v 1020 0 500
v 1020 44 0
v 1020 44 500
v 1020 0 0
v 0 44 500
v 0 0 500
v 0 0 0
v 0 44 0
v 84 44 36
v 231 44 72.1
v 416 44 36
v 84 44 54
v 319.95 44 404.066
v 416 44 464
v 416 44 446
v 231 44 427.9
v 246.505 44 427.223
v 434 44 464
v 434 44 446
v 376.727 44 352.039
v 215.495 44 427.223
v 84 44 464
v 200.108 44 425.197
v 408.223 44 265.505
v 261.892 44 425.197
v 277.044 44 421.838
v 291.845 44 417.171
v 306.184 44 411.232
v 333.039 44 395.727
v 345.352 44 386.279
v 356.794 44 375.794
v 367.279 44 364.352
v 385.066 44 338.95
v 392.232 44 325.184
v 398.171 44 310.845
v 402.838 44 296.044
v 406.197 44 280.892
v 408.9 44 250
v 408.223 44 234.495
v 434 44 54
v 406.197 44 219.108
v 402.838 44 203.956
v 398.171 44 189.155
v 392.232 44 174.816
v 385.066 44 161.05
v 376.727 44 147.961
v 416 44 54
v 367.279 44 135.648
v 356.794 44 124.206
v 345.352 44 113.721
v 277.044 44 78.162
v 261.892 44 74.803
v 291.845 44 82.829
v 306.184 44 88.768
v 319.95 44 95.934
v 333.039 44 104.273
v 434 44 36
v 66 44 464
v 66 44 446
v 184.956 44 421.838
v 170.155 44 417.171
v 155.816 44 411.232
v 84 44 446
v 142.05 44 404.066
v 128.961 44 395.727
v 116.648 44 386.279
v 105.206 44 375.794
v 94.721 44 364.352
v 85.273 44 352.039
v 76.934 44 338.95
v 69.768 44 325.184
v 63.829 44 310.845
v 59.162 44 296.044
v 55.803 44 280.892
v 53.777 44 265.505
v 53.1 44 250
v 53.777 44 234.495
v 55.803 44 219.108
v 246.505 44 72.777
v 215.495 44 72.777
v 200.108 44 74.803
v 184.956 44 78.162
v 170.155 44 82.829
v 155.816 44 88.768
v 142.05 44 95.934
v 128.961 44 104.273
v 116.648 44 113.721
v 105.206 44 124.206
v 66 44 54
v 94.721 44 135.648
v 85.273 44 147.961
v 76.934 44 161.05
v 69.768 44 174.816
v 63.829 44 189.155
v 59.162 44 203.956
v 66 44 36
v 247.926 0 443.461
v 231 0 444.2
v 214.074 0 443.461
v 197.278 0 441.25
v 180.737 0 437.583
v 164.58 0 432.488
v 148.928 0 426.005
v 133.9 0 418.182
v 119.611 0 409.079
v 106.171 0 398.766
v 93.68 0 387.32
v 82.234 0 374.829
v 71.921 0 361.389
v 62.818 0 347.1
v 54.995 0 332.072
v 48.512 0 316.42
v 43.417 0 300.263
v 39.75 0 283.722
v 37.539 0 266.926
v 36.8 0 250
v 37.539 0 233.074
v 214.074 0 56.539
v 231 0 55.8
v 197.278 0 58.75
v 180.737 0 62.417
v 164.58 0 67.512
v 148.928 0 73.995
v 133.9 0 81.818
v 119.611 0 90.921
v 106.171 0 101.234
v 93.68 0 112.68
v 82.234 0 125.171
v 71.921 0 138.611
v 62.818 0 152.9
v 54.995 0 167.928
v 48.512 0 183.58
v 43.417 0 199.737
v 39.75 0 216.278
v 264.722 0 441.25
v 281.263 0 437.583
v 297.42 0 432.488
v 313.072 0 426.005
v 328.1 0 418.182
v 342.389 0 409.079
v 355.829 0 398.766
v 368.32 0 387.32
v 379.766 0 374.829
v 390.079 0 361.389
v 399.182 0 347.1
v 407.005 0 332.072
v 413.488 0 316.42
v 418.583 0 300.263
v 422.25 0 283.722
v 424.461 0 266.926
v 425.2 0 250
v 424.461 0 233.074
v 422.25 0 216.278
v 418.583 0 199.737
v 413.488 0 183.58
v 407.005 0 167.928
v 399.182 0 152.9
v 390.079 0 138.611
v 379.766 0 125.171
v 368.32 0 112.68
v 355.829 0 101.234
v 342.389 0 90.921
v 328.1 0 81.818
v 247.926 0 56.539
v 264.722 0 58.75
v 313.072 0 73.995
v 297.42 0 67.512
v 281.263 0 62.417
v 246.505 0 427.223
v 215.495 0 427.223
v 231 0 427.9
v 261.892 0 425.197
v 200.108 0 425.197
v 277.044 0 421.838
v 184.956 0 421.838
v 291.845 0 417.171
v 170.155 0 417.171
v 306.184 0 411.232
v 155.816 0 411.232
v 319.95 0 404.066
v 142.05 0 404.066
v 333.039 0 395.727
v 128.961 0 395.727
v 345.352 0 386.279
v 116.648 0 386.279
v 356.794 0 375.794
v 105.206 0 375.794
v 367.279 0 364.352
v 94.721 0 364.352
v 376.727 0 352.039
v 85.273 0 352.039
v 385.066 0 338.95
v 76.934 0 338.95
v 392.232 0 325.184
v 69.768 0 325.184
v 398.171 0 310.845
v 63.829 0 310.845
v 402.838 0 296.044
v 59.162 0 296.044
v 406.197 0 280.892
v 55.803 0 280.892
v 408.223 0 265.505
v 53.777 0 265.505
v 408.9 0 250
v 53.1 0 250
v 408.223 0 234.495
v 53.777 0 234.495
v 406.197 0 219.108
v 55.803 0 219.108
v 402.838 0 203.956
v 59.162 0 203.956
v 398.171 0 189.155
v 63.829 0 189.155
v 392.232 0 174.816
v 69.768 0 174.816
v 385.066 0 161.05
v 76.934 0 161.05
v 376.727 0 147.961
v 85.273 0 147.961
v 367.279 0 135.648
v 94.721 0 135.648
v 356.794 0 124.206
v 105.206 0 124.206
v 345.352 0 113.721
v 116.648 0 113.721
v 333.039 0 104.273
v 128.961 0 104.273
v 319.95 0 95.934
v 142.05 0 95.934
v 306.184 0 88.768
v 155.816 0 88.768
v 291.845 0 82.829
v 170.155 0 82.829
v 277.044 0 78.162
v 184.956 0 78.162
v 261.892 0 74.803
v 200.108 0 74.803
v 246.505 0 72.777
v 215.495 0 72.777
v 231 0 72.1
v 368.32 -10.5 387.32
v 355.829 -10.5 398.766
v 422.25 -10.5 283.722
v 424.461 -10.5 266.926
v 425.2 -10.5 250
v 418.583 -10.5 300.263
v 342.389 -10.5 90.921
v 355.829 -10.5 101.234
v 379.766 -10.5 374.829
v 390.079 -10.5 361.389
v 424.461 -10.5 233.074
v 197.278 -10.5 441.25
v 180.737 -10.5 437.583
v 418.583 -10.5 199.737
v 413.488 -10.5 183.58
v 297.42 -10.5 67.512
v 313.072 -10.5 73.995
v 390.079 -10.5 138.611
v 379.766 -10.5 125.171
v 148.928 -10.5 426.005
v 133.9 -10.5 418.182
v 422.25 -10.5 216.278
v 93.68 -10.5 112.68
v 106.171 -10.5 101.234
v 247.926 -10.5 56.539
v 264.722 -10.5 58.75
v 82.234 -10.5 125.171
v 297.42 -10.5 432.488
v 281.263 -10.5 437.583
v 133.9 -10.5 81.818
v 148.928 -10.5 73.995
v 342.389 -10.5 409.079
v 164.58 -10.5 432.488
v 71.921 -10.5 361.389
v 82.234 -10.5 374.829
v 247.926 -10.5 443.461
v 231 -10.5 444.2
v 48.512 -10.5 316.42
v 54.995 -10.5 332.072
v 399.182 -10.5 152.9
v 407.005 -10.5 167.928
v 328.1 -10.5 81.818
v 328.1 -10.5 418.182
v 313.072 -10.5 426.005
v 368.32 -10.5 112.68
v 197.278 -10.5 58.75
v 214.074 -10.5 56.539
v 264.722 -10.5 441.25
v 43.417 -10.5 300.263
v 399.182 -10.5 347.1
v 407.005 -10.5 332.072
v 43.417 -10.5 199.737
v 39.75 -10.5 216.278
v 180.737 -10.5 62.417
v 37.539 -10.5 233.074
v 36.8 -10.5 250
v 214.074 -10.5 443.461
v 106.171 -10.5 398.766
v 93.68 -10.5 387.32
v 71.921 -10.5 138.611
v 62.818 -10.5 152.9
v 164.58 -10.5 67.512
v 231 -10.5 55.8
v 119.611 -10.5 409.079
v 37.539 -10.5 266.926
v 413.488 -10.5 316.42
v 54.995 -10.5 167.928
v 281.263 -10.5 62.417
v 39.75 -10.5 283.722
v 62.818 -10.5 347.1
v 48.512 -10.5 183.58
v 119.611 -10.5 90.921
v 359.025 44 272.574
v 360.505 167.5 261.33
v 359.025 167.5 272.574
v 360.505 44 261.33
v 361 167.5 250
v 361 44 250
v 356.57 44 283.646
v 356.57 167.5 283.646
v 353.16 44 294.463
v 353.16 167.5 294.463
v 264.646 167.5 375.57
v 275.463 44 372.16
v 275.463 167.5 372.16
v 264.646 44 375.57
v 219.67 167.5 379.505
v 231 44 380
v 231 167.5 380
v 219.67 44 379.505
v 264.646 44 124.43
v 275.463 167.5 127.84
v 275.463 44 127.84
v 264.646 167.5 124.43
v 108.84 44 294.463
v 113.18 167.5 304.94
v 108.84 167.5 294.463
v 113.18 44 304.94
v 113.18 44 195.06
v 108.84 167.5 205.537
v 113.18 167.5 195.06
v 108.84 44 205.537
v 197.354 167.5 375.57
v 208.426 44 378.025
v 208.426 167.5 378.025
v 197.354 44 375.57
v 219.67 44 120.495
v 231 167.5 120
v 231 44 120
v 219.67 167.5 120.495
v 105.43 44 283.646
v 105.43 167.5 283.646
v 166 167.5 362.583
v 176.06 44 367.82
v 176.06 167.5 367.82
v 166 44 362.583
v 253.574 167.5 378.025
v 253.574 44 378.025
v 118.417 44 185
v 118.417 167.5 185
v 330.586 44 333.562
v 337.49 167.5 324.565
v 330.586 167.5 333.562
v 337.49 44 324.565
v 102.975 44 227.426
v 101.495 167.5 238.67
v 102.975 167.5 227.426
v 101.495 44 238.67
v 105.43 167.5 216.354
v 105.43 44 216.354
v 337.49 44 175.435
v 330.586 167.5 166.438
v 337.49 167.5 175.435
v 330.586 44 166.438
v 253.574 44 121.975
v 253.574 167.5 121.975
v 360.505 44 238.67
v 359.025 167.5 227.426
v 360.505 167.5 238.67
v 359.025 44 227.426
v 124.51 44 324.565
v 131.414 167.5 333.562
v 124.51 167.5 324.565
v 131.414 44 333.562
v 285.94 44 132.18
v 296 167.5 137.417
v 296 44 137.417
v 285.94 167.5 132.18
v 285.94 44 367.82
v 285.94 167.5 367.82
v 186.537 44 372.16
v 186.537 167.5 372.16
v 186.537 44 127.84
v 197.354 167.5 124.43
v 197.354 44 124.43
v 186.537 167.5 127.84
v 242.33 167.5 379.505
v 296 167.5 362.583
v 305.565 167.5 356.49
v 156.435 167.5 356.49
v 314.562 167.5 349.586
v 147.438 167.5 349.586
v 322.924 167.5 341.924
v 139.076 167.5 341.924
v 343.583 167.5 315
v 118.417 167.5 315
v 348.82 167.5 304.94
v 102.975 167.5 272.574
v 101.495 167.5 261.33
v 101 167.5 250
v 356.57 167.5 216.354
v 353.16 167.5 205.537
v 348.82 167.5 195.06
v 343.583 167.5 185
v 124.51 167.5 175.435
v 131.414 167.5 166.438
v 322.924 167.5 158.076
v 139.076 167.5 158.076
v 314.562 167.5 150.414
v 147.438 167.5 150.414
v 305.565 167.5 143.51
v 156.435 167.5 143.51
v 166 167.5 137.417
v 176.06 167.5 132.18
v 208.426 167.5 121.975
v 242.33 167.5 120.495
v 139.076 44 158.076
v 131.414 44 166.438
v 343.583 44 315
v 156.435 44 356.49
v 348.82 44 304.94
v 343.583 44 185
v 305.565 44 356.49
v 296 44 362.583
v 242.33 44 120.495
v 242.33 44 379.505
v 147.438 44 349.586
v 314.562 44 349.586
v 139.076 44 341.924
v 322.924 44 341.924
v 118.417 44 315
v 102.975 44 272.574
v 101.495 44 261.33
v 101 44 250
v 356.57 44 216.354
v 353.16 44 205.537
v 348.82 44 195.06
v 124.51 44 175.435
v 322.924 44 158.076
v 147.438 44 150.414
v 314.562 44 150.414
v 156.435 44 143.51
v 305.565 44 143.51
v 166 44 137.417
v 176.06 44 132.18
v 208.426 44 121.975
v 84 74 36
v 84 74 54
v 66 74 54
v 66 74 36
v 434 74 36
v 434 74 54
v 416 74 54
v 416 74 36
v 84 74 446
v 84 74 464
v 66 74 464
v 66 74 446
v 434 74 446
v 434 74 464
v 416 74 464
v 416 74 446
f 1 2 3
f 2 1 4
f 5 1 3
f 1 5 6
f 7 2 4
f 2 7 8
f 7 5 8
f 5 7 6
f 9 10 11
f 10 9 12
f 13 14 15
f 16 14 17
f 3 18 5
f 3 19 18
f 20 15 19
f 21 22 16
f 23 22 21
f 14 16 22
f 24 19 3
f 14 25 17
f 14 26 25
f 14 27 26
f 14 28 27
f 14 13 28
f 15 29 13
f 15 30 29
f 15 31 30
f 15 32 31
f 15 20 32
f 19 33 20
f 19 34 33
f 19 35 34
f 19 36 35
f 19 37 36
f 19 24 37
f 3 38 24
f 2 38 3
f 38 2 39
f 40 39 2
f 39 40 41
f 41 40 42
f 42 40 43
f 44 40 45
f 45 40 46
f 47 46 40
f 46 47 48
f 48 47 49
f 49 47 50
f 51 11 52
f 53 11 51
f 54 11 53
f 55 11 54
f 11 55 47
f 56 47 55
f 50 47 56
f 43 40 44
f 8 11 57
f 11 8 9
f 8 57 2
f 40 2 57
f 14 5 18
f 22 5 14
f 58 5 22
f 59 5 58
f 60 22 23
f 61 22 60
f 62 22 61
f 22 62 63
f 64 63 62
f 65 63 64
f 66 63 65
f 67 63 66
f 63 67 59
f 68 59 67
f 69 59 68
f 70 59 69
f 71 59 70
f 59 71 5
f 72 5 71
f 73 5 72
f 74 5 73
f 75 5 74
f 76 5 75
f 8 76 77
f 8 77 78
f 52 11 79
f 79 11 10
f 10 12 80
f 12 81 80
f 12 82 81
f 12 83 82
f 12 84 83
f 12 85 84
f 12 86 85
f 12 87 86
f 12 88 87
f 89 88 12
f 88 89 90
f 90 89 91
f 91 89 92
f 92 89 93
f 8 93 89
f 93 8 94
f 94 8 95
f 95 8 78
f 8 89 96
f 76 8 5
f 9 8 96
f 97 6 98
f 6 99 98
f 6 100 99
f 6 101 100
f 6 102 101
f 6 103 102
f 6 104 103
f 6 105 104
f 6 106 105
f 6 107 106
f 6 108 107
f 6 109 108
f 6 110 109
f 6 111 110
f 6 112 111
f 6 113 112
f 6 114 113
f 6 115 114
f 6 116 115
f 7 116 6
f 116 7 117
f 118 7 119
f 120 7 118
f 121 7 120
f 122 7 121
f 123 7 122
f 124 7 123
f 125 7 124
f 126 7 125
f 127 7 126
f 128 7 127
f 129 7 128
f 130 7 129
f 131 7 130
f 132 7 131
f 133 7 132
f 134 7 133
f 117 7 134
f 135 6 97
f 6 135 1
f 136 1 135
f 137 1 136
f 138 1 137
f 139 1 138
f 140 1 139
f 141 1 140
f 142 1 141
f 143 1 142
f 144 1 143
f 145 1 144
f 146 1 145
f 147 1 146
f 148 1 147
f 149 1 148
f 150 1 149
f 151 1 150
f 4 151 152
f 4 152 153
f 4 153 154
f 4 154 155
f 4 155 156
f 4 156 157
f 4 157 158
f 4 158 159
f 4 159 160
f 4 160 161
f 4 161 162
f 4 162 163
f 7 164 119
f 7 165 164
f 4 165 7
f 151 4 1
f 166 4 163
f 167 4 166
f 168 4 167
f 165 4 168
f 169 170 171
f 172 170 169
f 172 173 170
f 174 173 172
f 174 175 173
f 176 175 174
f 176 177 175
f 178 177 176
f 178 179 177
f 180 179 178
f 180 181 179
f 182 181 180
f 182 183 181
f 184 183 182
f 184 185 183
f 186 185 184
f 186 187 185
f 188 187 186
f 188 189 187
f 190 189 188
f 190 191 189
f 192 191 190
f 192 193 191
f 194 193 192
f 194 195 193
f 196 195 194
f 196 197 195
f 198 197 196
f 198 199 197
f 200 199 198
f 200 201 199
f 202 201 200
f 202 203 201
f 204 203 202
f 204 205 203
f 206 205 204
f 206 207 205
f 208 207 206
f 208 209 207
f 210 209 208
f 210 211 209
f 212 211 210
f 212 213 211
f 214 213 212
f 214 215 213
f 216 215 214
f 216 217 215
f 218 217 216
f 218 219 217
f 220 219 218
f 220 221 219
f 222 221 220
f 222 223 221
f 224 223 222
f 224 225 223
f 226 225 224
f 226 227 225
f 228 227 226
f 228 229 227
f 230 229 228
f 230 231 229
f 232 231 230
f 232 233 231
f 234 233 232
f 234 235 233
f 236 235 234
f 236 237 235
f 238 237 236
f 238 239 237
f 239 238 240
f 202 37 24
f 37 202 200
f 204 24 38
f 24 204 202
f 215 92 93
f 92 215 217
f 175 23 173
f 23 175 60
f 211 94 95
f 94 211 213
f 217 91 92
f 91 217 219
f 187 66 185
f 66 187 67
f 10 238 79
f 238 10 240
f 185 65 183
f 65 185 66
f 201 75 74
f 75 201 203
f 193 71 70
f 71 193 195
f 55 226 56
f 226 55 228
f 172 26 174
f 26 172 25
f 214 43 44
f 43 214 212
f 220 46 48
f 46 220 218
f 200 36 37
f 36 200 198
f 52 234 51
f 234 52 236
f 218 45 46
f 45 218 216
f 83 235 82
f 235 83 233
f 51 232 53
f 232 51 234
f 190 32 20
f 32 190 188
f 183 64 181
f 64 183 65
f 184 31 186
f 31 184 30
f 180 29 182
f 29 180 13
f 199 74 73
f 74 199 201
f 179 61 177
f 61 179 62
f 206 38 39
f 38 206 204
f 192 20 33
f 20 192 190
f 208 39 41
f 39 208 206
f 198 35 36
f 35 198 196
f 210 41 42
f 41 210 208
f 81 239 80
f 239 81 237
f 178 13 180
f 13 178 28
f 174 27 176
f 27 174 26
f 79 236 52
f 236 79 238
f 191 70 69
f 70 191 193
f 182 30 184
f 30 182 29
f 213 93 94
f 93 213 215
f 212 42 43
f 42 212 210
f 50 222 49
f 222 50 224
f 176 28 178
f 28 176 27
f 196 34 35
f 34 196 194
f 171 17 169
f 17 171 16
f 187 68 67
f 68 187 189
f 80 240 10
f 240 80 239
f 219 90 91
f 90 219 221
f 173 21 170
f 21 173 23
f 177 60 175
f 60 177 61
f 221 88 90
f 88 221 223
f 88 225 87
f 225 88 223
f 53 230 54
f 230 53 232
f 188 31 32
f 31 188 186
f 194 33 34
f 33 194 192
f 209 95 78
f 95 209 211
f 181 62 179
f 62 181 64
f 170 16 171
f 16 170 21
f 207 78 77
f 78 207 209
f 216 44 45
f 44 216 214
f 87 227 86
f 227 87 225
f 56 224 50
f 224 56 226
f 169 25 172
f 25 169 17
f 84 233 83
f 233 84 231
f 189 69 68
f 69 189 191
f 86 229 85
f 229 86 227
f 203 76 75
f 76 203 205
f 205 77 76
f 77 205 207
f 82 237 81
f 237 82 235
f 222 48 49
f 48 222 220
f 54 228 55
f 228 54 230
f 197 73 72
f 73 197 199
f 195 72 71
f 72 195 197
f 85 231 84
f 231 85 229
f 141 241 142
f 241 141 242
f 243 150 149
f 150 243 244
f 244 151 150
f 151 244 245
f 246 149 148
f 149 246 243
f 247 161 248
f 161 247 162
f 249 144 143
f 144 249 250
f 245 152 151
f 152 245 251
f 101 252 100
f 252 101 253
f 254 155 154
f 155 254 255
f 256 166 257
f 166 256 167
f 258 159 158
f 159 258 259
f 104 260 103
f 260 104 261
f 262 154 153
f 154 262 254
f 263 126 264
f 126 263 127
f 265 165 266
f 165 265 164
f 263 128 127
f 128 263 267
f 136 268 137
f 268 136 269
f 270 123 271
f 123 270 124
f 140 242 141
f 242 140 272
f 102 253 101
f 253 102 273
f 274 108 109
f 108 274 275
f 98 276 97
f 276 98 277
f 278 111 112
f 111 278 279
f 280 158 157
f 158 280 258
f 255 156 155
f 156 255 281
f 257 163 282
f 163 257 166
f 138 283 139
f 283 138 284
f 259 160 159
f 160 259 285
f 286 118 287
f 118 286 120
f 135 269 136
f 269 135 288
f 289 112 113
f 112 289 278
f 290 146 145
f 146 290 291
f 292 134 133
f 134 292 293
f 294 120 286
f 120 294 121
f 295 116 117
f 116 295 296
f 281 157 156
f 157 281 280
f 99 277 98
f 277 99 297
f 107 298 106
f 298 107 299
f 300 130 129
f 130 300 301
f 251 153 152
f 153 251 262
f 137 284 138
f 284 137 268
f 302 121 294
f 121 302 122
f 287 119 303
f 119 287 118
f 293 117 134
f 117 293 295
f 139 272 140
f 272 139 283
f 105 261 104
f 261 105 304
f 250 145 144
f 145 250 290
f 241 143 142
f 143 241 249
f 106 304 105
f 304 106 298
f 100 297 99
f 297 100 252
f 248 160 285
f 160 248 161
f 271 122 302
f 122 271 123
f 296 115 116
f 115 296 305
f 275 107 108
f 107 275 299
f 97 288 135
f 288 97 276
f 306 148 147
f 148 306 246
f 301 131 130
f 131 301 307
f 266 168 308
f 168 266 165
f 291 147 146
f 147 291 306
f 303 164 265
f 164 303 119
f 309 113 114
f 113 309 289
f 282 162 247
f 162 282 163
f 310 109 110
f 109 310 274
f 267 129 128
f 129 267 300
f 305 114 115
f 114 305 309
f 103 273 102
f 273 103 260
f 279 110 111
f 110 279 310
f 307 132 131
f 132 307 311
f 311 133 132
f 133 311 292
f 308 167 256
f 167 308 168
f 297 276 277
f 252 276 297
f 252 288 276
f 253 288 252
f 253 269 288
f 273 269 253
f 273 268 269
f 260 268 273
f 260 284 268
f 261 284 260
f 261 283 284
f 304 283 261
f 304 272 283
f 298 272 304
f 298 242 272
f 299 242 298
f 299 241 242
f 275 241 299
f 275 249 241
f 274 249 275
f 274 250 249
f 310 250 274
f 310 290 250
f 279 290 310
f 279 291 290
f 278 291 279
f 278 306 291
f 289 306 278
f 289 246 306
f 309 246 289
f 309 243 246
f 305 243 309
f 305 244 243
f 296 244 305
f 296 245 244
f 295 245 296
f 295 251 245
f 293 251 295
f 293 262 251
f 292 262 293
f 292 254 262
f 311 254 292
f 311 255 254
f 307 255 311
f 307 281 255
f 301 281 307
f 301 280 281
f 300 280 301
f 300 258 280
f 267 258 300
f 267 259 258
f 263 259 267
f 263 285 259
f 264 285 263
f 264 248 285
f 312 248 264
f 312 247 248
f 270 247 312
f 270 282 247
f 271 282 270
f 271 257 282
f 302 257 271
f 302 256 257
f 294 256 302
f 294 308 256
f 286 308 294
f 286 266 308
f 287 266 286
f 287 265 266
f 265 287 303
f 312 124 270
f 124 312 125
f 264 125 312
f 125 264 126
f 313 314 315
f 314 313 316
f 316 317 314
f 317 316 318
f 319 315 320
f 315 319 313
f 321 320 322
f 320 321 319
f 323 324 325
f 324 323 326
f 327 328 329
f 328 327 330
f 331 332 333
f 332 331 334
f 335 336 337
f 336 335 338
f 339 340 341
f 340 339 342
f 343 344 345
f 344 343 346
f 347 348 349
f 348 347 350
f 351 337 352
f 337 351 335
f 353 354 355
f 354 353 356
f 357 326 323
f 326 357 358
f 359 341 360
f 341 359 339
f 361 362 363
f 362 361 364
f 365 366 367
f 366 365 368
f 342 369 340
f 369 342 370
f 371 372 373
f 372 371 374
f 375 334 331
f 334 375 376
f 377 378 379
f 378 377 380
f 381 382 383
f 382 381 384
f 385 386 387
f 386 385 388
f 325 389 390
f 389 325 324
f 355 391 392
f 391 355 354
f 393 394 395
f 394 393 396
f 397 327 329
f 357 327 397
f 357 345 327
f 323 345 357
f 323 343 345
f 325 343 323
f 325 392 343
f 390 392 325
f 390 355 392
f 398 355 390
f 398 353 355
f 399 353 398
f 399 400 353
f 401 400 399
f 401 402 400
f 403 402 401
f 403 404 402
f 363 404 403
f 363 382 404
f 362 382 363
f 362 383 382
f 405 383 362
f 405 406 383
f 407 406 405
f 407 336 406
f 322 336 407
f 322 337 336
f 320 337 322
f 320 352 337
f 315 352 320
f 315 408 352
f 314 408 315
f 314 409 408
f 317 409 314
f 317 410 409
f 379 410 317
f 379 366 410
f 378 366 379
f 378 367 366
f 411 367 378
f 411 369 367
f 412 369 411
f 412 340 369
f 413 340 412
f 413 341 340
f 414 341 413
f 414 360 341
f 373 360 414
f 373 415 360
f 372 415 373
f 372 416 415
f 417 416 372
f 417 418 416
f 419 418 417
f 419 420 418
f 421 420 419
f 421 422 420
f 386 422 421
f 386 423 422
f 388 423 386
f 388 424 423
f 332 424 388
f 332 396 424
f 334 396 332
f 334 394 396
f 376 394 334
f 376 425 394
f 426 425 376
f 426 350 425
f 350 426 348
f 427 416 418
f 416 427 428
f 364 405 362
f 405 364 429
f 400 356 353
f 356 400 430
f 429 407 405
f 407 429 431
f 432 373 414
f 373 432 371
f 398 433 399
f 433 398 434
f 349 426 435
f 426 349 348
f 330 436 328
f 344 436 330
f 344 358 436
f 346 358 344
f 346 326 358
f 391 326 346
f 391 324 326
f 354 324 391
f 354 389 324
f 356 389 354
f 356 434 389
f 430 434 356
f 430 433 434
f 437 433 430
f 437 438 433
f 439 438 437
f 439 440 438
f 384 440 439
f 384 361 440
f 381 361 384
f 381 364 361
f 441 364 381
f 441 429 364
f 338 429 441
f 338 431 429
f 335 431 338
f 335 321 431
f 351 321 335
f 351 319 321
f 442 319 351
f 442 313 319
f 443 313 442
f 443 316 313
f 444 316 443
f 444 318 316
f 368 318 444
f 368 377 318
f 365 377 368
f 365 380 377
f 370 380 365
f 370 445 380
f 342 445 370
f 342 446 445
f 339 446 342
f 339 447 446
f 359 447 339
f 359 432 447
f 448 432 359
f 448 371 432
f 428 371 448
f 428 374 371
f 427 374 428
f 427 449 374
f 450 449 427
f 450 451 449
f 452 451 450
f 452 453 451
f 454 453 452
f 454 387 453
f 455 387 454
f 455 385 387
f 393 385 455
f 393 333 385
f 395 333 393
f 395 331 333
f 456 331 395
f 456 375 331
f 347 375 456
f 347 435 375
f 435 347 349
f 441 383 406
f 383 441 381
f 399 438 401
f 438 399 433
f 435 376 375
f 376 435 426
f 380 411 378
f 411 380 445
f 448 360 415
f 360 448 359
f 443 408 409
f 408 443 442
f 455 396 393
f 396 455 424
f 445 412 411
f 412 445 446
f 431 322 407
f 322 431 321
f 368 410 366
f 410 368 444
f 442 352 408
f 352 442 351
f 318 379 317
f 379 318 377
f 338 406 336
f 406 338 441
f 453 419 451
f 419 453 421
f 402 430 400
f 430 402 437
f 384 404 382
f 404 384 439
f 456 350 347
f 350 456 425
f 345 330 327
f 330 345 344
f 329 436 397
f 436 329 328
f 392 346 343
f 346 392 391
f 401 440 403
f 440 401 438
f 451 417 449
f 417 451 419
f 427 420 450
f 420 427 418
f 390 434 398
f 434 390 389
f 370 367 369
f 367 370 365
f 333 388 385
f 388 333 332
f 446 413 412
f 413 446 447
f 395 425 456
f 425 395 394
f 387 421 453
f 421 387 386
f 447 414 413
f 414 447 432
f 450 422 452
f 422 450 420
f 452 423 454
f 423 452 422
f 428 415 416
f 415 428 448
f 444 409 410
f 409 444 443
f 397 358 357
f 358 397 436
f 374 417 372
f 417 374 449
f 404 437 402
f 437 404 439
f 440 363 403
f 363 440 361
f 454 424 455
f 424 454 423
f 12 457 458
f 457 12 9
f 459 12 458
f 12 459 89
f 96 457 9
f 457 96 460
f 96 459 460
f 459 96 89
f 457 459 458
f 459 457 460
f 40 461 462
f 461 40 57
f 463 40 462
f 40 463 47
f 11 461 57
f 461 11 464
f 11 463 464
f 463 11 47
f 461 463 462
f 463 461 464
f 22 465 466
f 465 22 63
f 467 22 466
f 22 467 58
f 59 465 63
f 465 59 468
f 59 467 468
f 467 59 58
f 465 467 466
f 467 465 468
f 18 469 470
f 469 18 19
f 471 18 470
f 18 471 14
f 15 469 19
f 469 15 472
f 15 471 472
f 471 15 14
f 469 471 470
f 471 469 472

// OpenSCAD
// P42D - EXPLORATORY 3D paths; geometry only, NOT CNC or checked load paths.
// OpenSCAD, units mm. Change variant to "rails4" to compare.
// Driver basket/magnet and bolted connections are SURROGATES.
$fn=72;
variant="carrier4"; // carrier4 or rails4
show_panel=true;
show_driver_envelope=true;
show_supports=true;
show_straight_links=false; // WARNING: some straight 2D links cross cutout (P42C).
baffle_W=1020;baffle_D=425;baffle_H=500;front_t=44;wall_t=22;
driver_x=231;driver_z=250;cutout_d=355.8;frame_d=388.4;bolt_r=184;
carrier_points=[[75,45],[425,45],[75,455],[425,455]];
rails_points=[[176,37],[286,37],[176,463],[286,463]];
points=variant=="carrier4"?carrier_points:rails_points;
half_width=9;
assert(variant=="carrier4"||variant=="rails4","Unknown variant");
assert(driver_x-frame_d/2>wall_t,"Driver flanged edge crosses left inner wall");
assert(driver_z-frame_d/2>wall_t,"Driver flanged edge crosses lower inner wall");
module ycylinder(d,h,x,y,z){
 translate([x,y,z])rotate([90,0,0])cylinder(d=d,h=h,center=true);
}
module panel(){
 color([0.80,0.65,0.48,.75])difference(){
  cube([baffle_W,front_t,baffle_H]);
  ycylinder(cutout_d,front_t+2,driver_x,front_t/2,driver_z);
 }
}
module basket_envelope(){
 color([.22,.36,.52,.50])ycylinder(frame_d,10.5,driver_x,-5.25,driver_z);
 color([.35,.55,.65,.16])ycylinder(260,123.5,driver_x,front_t+123.5/2,driver_z);
}
module pad(q){
 color([.26,.58,.65,.85])translate([q[0]-half_width,front_t,q[1]-half_width])
 cube([2*half_width,30,2*half_width]);
}
module rail(q){
 color([.35,.58,.60,.65])translate([q[0]-half_width,front_t,q[1]-half_width])
 cube([2*half_width,baffle_D-front_t-wall_t,2*half_width]);
}
module link_segment(a,b){
 // Unqualified straight carrier link: may project into cutout/motor.
 color([.87,.43,.32,.70])hull(){
  ycylinder(8,7,a[0],front_t+8,a[1]);
  ycylinder(8,7,b[0],front_t+8,b[1]);
 }
}
function dist2(a,b)=(a[0]-b[0])*(a[0]-b[0])+(a[1]-b[1])*(a[1]-b[1]);
function nearest_pad_idx(b)=let(v=[for(i=[0:len(points)-1])dist2(points[i],b)])
 search(min(v),v)[0];
if(show_panel)panel();
if(show_driver_envelope)basket_envelope();
if(show_supports)for(p=points) {
 if(variant=="carrier4")pad(p);
 else rail(p);
}
if(show_straight_links)for(i=[0:7]){
 bolt=[driver_x+bolt_r*cos(45*i),driver_z+bolt_r*sin(45*i)];
 link_segment(bolt,points[nearest_pad_idx(bolt)]);
}
echo("P41 supports:",variant,"points:",len(points));
echo("All support-to-driver links and wall joints are NOT qualified. Do not use for CNC.");
